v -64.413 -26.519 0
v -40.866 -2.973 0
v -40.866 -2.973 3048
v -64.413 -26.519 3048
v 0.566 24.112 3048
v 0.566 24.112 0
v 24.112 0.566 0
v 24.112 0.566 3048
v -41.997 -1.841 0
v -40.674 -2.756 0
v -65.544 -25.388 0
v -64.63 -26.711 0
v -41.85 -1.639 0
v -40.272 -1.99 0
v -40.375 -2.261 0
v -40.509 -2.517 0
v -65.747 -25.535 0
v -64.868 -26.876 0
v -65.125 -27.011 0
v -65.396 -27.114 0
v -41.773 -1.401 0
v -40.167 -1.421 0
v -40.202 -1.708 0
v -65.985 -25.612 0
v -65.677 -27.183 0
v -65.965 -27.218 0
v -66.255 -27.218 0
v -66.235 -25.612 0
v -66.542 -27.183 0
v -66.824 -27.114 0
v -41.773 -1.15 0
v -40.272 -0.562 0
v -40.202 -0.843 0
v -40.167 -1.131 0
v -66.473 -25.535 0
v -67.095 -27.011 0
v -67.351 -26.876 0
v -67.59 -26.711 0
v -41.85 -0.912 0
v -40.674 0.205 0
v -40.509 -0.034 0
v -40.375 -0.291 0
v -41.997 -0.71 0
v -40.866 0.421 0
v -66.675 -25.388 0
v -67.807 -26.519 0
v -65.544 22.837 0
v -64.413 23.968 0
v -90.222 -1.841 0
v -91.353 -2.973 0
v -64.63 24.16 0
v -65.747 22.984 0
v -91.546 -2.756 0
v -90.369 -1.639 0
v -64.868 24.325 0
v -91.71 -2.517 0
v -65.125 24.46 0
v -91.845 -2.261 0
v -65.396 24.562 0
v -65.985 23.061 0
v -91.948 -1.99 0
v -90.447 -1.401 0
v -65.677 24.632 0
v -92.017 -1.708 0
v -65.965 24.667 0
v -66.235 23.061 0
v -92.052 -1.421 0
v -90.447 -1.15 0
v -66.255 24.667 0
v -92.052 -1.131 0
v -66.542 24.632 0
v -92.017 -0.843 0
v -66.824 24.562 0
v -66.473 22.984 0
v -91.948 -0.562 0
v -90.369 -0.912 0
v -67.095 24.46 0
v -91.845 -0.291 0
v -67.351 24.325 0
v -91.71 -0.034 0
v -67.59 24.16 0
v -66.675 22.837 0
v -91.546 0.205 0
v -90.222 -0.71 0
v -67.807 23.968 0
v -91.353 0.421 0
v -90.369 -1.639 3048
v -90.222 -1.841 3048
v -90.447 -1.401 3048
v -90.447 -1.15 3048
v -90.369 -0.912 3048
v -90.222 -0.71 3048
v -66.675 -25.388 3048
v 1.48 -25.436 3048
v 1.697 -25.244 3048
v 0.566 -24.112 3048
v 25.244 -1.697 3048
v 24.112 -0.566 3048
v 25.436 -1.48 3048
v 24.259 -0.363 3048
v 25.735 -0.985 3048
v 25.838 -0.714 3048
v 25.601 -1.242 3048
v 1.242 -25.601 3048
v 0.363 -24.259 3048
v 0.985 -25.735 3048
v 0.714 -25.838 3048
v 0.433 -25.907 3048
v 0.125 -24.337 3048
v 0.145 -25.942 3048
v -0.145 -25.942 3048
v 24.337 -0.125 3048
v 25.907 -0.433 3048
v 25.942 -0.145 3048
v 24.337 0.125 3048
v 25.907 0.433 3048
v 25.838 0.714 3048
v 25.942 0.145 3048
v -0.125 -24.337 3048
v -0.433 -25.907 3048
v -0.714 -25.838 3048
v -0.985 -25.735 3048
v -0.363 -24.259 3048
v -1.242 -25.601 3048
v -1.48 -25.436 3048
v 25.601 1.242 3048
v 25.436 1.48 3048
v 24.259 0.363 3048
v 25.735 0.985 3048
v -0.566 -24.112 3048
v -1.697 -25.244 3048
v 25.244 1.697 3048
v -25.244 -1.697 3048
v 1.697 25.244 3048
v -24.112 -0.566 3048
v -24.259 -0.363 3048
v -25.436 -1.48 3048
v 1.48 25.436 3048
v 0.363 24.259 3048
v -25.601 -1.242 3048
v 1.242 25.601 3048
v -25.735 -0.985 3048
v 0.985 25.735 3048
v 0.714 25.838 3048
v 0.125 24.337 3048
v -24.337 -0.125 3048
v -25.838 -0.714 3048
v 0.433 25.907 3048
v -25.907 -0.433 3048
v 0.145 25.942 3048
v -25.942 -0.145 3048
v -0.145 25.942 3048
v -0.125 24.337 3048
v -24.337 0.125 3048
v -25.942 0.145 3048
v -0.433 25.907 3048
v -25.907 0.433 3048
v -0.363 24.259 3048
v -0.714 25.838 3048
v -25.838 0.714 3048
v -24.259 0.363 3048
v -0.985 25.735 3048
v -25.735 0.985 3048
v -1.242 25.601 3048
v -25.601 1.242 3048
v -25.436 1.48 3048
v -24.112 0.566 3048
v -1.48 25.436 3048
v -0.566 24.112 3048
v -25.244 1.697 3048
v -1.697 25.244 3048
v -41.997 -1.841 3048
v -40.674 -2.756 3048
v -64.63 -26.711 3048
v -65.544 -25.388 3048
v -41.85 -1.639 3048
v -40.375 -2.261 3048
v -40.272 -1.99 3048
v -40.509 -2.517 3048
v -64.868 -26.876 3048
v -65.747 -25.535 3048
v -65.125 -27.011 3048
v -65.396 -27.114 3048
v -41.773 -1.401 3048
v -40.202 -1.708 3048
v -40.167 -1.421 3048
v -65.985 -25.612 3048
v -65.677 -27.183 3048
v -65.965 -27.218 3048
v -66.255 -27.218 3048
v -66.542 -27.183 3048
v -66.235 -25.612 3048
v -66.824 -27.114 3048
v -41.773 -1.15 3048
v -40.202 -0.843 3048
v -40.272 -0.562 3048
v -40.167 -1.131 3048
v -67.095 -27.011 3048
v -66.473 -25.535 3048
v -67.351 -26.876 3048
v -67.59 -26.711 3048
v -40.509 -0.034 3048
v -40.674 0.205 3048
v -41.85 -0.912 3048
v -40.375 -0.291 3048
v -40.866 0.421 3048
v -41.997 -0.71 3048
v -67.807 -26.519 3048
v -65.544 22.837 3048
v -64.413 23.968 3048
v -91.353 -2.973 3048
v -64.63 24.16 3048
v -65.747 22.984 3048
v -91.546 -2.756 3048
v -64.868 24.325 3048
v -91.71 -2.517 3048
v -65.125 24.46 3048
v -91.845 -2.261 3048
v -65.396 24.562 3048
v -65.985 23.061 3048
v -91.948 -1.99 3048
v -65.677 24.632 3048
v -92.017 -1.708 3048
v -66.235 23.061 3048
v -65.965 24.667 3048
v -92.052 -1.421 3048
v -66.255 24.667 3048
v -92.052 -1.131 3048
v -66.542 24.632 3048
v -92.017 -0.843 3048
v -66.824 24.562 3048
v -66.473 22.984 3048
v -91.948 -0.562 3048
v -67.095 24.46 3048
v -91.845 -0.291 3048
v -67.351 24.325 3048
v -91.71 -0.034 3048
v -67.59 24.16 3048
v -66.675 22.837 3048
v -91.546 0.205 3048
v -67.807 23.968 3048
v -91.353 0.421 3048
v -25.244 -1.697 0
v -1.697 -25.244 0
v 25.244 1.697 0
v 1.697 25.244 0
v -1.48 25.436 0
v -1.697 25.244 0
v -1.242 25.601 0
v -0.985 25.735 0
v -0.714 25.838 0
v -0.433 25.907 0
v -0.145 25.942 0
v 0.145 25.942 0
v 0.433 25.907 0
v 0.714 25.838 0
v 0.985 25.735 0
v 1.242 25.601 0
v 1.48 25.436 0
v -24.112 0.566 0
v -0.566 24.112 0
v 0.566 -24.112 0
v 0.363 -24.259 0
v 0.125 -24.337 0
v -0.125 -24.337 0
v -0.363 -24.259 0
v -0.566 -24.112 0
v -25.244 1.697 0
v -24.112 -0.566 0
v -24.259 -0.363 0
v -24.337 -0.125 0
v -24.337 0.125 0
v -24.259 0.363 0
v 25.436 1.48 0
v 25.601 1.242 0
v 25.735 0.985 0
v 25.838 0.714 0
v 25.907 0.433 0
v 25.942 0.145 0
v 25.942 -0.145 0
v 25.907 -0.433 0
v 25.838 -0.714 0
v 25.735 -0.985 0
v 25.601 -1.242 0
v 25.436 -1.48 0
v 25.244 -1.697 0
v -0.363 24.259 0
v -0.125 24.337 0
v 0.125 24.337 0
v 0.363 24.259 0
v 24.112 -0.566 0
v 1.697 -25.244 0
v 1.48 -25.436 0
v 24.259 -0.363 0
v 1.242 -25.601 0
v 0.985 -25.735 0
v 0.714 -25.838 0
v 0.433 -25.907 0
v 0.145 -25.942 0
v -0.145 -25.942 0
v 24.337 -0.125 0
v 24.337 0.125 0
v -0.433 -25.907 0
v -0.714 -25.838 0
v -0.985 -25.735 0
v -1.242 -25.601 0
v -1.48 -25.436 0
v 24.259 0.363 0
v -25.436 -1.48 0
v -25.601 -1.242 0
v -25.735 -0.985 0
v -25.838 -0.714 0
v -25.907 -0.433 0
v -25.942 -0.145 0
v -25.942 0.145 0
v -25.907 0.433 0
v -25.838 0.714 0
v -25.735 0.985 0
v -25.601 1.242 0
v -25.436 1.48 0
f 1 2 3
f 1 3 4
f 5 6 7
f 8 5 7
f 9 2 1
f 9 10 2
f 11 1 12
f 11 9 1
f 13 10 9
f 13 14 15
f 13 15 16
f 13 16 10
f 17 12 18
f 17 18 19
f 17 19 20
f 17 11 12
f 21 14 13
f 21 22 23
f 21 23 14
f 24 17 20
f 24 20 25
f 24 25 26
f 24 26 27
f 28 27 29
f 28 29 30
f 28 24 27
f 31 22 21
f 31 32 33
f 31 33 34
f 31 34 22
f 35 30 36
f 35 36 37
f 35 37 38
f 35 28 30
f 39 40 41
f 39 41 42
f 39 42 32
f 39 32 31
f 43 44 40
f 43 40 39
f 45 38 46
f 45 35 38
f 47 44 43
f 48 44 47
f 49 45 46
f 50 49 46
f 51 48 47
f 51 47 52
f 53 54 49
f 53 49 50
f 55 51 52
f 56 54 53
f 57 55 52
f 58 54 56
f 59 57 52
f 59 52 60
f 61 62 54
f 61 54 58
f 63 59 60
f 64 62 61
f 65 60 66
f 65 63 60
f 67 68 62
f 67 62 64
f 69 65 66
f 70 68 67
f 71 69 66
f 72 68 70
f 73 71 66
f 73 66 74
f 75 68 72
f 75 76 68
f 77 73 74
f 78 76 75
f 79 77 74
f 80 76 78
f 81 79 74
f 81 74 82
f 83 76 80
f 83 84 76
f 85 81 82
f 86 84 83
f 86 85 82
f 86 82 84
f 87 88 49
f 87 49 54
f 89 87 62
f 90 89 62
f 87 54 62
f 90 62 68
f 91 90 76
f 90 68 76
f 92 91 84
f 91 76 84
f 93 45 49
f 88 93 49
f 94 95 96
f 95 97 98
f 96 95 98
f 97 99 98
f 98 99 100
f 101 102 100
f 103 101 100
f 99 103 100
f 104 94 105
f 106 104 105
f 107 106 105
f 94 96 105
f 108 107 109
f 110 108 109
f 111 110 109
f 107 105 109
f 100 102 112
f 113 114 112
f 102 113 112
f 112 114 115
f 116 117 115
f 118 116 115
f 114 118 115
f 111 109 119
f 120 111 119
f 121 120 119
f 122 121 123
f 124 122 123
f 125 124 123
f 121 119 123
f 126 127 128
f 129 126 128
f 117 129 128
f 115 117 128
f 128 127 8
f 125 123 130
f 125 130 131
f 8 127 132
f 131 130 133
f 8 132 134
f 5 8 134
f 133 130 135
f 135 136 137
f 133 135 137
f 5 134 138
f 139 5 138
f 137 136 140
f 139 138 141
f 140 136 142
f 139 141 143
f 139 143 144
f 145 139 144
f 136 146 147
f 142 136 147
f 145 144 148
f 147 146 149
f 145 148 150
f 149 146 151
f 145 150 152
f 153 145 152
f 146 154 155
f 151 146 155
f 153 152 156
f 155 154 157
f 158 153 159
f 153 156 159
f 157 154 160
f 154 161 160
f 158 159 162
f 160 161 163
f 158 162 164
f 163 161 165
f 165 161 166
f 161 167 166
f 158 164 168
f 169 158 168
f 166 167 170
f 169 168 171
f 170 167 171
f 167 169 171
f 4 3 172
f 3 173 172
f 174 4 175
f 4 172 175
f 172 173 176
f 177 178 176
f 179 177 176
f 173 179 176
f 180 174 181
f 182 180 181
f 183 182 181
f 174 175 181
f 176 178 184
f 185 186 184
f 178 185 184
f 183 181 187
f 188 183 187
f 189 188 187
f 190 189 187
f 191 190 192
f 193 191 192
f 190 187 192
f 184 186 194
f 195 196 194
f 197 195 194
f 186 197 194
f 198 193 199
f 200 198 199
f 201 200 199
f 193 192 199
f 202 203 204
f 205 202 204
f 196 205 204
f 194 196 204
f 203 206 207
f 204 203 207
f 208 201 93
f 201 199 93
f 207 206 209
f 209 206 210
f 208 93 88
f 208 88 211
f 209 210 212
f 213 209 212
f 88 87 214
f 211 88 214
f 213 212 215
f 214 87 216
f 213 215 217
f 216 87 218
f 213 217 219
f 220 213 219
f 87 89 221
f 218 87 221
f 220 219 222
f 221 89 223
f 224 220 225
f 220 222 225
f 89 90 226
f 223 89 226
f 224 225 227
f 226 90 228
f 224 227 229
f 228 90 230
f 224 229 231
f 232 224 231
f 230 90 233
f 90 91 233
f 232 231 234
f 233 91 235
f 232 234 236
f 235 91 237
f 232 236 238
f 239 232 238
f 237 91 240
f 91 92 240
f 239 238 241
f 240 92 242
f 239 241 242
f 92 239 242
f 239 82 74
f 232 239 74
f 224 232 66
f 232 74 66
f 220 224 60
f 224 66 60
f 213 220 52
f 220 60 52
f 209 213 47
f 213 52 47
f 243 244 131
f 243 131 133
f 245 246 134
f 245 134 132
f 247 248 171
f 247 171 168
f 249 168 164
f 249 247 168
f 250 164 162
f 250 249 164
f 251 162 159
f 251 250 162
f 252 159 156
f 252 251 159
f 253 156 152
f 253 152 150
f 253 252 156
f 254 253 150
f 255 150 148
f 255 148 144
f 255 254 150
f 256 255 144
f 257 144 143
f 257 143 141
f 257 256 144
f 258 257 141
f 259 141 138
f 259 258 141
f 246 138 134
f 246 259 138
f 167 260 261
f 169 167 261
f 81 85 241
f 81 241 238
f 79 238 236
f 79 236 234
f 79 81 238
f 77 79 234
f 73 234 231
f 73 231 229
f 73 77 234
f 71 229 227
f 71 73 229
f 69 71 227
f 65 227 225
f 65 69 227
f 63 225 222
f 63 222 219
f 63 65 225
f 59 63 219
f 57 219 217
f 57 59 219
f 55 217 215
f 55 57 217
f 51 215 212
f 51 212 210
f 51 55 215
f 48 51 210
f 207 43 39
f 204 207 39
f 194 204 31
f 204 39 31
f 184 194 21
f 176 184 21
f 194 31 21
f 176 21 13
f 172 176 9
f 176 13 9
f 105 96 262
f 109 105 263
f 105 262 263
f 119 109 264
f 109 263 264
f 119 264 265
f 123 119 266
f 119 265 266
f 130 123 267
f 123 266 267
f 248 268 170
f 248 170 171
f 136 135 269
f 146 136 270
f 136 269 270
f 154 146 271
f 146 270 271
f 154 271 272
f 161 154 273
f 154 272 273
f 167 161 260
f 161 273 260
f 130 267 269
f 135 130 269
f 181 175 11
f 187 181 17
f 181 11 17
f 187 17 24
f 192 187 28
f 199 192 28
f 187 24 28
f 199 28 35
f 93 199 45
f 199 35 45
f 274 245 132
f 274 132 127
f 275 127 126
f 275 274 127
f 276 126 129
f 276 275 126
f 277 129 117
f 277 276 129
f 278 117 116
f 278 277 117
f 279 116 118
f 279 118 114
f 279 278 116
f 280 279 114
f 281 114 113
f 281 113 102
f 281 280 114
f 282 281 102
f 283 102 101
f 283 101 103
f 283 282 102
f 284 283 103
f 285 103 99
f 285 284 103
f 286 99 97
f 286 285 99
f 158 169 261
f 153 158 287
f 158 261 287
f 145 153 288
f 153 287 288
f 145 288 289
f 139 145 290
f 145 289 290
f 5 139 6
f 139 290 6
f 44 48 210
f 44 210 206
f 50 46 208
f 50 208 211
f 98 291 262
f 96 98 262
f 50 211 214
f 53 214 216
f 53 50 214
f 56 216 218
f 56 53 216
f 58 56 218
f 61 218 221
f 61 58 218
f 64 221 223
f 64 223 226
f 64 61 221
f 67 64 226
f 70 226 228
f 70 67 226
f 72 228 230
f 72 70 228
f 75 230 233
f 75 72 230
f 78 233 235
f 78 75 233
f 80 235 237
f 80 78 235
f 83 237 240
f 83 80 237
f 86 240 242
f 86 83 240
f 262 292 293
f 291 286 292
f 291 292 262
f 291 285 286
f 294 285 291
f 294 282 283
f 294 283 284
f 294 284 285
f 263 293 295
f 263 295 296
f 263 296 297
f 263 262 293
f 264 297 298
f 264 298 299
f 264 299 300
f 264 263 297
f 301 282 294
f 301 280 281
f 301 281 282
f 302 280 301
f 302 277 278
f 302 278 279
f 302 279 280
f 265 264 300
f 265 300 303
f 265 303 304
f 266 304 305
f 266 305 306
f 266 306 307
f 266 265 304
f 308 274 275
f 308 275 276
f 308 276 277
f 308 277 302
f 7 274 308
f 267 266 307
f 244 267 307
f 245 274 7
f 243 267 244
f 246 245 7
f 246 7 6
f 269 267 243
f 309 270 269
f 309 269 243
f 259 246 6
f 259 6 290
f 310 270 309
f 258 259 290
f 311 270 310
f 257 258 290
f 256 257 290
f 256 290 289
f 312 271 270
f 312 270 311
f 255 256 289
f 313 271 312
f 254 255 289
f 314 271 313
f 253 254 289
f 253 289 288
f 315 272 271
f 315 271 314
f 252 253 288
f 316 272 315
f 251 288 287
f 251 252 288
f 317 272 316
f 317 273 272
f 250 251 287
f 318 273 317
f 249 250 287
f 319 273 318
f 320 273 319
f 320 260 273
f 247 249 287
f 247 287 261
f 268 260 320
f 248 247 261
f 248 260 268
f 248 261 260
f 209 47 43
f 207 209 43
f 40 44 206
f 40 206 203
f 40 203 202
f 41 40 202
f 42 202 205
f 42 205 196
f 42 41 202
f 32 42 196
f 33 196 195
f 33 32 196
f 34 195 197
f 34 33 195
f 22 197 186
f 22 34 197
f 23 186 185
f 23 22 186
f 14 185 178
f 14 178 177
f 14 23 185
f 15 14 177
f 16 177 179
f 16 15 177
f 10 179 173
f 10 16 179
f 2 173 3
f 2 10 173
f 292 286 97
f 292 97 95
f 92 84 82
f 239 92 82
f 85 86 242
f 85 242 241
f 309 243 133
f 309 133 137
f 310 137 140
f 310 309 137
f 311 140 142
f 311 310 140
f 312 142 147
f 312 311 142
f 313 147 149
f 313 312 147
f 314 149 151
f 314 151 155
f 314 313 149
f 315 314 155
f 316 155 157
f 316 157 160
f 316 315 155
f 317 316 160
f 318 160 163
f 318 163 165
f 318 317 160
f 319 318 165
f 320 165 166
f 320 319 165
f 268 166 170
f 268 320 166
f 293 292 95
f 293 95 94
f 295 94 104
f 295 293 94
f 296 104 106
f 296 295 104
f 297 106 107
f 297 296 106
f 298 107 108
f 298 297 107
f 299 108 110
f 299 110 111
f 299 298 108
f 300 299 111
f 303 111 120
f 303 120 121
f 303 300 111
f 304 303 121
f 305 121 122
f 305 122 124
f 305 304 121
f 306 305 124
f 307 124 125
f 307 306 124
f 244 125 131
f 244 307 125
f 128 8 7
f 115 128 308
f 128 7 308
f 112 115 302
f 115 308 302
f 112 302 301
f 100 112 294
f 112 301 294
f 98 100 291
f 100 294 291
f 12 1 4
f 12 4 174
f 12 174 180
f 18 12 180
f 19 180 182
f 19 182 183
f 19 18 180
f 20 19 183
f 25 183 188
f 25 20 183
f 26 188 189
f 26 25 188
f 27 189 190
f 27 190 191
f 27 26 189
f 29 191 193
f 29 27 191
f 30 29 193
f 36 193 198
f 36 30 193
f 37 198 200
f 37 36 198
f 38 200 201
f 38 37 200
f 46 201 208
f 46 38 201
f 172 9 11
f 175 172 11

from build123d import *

# Parameters (mm, degrees)
BOSS_EXTRUDE1_DEPTH   = 3048
BOSS_EXTRUDE1_2_DEPTH = 3048


with BuildPart() as part:
    # inch square tube → Boss-Extrude1 (new body)
    with BuildSketch(Plane.XY):
        with BuildLine():
            Line((25.243712088, -1.697056275), (1.697056275, -25.243712088))
            ThreePointArc((1.697056275, -25.243712088), (0, -25.946655814), (-1.697056275, -25.243712088))
            Line((-1.697056275, -25.243712088), (-25.243712088, -1.697056275))
            ThreePointArc((-25.243712088, -1.697056275), (-25.946655814, 0), (-25.243712088, 1.697056275))
            Line((-25.243712088, 1.697056275), (-1.697056275, 25.243712088))
            ThreePointArc((-1.697056275, 25.243712088), (0, 25.946655814), (1.697056275, 25.243712088))
            Line((1.697056275, 25.243712088), (25.243712088, 1.697056275))
            ThreePointArc((25.243712088, 1.697056275), (25.946655814, 0), (25.243712088, -1.697056275))
        make_face()
        with BuildLine():
            Line((-24.112341238, 0.565685425), (-0.565685425, 24.112341238))
            ThreePointArc((-0.565685425, 24.112341238), (0, 24.346655814), (0.565685425, 24.112341238))
            Line((0.565685425, 24.112341238), (24.112341238, 0.565685425))
            ThreePointArc((24.112341238, 0.565685425), (24.346655814, 0), (24.112341238, -0.565685425))
            Line((24.112341238, -0.565685425), (0.565685425, -24.112341238))
            ThreePointArc((0.565685425, -24.112341238), (0, -24.346655814), (-0.565685425, -24.112341238))
            Line((-0.565685425, -24.112341238), (-24.112341238, -0.565685425))
            ThreePointArc((-24.112341238, -0.565685425), (-24.346655814, 0), (-24.112341238, 0.565685425))
        make_face(mode=Mode.SUBTRACT)
    extrude(amount=BOSS_EXTRUDE1_DEPTH)


with BuildPart() as body_2:
    # inch square tube → Boss-Extrude1 2 (new body)
    with BuildSketch(Plane.XY):
        with BuildLine():
            Line((-40.866058562, -2.972649224), (-64.412714375, -26.519305038))
            ThreePointArc((-64.412714375, -26.519305038), (-66.10977065, -27.222248763), (-67.806826925, -26.519305038))
            Line((-67.806826925, -26.519305038), (-91.353482739, -2.972649224))
            ThreePointArc((-91.353482739, -2.972649224), (-92.056426464, -1.27559295), (-91.353482739, 0.421463325))
            Line((-91.353482739, 0.421463325), (-67.806826925, 23.968119139))
            ThreePointArc((-67.806826925, 23.968119139), (-66.10977065, 24.671062864), (-64.412714375, 23.968119139))
            Line((-64.412714375, 23.968119139), (-40.866058562, 0.421463325))
            ThreePointArc((-40.866058562, 0.421463325), (-40.163114837, -1.27559295), (-40.866058562, -2.972649224))
        make_face()
        with BuildLine():
            Line((-90.222111889, -0.709907525), (-66.675456075, 22.836748289))
            ThreePointArc((-66.675456075, 22.836748289), (-66.10977065, 23.071062864), (-65.544085225, 22.836748289))
            Line((-65.544085225, 22.836748289), (-41.997429412, -0.709907525))
            ThreePointArc((-41.997429412, -0.709907525), (-41.763114837, -1.27559295), (-41.997429412, -1.841278375))
            Line((-41.997429412, -1.841278375), (-65.544085225, -25.387934188))
            ThreePointArc((-65.544085225, -25.387934188), (-66.10977065, -25.622248763), (-66.675456075, -25.387934188))
            Line((-66.675456075, -25.387934188), (-90.222111889, -1.841278375))
            ThreePointArc((-90.222111889, -1.841278375), (-90.456426464, -1.27559295), (-90.222111889, -0.709907525))
        make_face(mode=Mode.SUBTRACT)
    extrude(amount=BOSS_EXTRUDE1_2_DEPTH)


solid = Compound([part.part, body_2.part])
